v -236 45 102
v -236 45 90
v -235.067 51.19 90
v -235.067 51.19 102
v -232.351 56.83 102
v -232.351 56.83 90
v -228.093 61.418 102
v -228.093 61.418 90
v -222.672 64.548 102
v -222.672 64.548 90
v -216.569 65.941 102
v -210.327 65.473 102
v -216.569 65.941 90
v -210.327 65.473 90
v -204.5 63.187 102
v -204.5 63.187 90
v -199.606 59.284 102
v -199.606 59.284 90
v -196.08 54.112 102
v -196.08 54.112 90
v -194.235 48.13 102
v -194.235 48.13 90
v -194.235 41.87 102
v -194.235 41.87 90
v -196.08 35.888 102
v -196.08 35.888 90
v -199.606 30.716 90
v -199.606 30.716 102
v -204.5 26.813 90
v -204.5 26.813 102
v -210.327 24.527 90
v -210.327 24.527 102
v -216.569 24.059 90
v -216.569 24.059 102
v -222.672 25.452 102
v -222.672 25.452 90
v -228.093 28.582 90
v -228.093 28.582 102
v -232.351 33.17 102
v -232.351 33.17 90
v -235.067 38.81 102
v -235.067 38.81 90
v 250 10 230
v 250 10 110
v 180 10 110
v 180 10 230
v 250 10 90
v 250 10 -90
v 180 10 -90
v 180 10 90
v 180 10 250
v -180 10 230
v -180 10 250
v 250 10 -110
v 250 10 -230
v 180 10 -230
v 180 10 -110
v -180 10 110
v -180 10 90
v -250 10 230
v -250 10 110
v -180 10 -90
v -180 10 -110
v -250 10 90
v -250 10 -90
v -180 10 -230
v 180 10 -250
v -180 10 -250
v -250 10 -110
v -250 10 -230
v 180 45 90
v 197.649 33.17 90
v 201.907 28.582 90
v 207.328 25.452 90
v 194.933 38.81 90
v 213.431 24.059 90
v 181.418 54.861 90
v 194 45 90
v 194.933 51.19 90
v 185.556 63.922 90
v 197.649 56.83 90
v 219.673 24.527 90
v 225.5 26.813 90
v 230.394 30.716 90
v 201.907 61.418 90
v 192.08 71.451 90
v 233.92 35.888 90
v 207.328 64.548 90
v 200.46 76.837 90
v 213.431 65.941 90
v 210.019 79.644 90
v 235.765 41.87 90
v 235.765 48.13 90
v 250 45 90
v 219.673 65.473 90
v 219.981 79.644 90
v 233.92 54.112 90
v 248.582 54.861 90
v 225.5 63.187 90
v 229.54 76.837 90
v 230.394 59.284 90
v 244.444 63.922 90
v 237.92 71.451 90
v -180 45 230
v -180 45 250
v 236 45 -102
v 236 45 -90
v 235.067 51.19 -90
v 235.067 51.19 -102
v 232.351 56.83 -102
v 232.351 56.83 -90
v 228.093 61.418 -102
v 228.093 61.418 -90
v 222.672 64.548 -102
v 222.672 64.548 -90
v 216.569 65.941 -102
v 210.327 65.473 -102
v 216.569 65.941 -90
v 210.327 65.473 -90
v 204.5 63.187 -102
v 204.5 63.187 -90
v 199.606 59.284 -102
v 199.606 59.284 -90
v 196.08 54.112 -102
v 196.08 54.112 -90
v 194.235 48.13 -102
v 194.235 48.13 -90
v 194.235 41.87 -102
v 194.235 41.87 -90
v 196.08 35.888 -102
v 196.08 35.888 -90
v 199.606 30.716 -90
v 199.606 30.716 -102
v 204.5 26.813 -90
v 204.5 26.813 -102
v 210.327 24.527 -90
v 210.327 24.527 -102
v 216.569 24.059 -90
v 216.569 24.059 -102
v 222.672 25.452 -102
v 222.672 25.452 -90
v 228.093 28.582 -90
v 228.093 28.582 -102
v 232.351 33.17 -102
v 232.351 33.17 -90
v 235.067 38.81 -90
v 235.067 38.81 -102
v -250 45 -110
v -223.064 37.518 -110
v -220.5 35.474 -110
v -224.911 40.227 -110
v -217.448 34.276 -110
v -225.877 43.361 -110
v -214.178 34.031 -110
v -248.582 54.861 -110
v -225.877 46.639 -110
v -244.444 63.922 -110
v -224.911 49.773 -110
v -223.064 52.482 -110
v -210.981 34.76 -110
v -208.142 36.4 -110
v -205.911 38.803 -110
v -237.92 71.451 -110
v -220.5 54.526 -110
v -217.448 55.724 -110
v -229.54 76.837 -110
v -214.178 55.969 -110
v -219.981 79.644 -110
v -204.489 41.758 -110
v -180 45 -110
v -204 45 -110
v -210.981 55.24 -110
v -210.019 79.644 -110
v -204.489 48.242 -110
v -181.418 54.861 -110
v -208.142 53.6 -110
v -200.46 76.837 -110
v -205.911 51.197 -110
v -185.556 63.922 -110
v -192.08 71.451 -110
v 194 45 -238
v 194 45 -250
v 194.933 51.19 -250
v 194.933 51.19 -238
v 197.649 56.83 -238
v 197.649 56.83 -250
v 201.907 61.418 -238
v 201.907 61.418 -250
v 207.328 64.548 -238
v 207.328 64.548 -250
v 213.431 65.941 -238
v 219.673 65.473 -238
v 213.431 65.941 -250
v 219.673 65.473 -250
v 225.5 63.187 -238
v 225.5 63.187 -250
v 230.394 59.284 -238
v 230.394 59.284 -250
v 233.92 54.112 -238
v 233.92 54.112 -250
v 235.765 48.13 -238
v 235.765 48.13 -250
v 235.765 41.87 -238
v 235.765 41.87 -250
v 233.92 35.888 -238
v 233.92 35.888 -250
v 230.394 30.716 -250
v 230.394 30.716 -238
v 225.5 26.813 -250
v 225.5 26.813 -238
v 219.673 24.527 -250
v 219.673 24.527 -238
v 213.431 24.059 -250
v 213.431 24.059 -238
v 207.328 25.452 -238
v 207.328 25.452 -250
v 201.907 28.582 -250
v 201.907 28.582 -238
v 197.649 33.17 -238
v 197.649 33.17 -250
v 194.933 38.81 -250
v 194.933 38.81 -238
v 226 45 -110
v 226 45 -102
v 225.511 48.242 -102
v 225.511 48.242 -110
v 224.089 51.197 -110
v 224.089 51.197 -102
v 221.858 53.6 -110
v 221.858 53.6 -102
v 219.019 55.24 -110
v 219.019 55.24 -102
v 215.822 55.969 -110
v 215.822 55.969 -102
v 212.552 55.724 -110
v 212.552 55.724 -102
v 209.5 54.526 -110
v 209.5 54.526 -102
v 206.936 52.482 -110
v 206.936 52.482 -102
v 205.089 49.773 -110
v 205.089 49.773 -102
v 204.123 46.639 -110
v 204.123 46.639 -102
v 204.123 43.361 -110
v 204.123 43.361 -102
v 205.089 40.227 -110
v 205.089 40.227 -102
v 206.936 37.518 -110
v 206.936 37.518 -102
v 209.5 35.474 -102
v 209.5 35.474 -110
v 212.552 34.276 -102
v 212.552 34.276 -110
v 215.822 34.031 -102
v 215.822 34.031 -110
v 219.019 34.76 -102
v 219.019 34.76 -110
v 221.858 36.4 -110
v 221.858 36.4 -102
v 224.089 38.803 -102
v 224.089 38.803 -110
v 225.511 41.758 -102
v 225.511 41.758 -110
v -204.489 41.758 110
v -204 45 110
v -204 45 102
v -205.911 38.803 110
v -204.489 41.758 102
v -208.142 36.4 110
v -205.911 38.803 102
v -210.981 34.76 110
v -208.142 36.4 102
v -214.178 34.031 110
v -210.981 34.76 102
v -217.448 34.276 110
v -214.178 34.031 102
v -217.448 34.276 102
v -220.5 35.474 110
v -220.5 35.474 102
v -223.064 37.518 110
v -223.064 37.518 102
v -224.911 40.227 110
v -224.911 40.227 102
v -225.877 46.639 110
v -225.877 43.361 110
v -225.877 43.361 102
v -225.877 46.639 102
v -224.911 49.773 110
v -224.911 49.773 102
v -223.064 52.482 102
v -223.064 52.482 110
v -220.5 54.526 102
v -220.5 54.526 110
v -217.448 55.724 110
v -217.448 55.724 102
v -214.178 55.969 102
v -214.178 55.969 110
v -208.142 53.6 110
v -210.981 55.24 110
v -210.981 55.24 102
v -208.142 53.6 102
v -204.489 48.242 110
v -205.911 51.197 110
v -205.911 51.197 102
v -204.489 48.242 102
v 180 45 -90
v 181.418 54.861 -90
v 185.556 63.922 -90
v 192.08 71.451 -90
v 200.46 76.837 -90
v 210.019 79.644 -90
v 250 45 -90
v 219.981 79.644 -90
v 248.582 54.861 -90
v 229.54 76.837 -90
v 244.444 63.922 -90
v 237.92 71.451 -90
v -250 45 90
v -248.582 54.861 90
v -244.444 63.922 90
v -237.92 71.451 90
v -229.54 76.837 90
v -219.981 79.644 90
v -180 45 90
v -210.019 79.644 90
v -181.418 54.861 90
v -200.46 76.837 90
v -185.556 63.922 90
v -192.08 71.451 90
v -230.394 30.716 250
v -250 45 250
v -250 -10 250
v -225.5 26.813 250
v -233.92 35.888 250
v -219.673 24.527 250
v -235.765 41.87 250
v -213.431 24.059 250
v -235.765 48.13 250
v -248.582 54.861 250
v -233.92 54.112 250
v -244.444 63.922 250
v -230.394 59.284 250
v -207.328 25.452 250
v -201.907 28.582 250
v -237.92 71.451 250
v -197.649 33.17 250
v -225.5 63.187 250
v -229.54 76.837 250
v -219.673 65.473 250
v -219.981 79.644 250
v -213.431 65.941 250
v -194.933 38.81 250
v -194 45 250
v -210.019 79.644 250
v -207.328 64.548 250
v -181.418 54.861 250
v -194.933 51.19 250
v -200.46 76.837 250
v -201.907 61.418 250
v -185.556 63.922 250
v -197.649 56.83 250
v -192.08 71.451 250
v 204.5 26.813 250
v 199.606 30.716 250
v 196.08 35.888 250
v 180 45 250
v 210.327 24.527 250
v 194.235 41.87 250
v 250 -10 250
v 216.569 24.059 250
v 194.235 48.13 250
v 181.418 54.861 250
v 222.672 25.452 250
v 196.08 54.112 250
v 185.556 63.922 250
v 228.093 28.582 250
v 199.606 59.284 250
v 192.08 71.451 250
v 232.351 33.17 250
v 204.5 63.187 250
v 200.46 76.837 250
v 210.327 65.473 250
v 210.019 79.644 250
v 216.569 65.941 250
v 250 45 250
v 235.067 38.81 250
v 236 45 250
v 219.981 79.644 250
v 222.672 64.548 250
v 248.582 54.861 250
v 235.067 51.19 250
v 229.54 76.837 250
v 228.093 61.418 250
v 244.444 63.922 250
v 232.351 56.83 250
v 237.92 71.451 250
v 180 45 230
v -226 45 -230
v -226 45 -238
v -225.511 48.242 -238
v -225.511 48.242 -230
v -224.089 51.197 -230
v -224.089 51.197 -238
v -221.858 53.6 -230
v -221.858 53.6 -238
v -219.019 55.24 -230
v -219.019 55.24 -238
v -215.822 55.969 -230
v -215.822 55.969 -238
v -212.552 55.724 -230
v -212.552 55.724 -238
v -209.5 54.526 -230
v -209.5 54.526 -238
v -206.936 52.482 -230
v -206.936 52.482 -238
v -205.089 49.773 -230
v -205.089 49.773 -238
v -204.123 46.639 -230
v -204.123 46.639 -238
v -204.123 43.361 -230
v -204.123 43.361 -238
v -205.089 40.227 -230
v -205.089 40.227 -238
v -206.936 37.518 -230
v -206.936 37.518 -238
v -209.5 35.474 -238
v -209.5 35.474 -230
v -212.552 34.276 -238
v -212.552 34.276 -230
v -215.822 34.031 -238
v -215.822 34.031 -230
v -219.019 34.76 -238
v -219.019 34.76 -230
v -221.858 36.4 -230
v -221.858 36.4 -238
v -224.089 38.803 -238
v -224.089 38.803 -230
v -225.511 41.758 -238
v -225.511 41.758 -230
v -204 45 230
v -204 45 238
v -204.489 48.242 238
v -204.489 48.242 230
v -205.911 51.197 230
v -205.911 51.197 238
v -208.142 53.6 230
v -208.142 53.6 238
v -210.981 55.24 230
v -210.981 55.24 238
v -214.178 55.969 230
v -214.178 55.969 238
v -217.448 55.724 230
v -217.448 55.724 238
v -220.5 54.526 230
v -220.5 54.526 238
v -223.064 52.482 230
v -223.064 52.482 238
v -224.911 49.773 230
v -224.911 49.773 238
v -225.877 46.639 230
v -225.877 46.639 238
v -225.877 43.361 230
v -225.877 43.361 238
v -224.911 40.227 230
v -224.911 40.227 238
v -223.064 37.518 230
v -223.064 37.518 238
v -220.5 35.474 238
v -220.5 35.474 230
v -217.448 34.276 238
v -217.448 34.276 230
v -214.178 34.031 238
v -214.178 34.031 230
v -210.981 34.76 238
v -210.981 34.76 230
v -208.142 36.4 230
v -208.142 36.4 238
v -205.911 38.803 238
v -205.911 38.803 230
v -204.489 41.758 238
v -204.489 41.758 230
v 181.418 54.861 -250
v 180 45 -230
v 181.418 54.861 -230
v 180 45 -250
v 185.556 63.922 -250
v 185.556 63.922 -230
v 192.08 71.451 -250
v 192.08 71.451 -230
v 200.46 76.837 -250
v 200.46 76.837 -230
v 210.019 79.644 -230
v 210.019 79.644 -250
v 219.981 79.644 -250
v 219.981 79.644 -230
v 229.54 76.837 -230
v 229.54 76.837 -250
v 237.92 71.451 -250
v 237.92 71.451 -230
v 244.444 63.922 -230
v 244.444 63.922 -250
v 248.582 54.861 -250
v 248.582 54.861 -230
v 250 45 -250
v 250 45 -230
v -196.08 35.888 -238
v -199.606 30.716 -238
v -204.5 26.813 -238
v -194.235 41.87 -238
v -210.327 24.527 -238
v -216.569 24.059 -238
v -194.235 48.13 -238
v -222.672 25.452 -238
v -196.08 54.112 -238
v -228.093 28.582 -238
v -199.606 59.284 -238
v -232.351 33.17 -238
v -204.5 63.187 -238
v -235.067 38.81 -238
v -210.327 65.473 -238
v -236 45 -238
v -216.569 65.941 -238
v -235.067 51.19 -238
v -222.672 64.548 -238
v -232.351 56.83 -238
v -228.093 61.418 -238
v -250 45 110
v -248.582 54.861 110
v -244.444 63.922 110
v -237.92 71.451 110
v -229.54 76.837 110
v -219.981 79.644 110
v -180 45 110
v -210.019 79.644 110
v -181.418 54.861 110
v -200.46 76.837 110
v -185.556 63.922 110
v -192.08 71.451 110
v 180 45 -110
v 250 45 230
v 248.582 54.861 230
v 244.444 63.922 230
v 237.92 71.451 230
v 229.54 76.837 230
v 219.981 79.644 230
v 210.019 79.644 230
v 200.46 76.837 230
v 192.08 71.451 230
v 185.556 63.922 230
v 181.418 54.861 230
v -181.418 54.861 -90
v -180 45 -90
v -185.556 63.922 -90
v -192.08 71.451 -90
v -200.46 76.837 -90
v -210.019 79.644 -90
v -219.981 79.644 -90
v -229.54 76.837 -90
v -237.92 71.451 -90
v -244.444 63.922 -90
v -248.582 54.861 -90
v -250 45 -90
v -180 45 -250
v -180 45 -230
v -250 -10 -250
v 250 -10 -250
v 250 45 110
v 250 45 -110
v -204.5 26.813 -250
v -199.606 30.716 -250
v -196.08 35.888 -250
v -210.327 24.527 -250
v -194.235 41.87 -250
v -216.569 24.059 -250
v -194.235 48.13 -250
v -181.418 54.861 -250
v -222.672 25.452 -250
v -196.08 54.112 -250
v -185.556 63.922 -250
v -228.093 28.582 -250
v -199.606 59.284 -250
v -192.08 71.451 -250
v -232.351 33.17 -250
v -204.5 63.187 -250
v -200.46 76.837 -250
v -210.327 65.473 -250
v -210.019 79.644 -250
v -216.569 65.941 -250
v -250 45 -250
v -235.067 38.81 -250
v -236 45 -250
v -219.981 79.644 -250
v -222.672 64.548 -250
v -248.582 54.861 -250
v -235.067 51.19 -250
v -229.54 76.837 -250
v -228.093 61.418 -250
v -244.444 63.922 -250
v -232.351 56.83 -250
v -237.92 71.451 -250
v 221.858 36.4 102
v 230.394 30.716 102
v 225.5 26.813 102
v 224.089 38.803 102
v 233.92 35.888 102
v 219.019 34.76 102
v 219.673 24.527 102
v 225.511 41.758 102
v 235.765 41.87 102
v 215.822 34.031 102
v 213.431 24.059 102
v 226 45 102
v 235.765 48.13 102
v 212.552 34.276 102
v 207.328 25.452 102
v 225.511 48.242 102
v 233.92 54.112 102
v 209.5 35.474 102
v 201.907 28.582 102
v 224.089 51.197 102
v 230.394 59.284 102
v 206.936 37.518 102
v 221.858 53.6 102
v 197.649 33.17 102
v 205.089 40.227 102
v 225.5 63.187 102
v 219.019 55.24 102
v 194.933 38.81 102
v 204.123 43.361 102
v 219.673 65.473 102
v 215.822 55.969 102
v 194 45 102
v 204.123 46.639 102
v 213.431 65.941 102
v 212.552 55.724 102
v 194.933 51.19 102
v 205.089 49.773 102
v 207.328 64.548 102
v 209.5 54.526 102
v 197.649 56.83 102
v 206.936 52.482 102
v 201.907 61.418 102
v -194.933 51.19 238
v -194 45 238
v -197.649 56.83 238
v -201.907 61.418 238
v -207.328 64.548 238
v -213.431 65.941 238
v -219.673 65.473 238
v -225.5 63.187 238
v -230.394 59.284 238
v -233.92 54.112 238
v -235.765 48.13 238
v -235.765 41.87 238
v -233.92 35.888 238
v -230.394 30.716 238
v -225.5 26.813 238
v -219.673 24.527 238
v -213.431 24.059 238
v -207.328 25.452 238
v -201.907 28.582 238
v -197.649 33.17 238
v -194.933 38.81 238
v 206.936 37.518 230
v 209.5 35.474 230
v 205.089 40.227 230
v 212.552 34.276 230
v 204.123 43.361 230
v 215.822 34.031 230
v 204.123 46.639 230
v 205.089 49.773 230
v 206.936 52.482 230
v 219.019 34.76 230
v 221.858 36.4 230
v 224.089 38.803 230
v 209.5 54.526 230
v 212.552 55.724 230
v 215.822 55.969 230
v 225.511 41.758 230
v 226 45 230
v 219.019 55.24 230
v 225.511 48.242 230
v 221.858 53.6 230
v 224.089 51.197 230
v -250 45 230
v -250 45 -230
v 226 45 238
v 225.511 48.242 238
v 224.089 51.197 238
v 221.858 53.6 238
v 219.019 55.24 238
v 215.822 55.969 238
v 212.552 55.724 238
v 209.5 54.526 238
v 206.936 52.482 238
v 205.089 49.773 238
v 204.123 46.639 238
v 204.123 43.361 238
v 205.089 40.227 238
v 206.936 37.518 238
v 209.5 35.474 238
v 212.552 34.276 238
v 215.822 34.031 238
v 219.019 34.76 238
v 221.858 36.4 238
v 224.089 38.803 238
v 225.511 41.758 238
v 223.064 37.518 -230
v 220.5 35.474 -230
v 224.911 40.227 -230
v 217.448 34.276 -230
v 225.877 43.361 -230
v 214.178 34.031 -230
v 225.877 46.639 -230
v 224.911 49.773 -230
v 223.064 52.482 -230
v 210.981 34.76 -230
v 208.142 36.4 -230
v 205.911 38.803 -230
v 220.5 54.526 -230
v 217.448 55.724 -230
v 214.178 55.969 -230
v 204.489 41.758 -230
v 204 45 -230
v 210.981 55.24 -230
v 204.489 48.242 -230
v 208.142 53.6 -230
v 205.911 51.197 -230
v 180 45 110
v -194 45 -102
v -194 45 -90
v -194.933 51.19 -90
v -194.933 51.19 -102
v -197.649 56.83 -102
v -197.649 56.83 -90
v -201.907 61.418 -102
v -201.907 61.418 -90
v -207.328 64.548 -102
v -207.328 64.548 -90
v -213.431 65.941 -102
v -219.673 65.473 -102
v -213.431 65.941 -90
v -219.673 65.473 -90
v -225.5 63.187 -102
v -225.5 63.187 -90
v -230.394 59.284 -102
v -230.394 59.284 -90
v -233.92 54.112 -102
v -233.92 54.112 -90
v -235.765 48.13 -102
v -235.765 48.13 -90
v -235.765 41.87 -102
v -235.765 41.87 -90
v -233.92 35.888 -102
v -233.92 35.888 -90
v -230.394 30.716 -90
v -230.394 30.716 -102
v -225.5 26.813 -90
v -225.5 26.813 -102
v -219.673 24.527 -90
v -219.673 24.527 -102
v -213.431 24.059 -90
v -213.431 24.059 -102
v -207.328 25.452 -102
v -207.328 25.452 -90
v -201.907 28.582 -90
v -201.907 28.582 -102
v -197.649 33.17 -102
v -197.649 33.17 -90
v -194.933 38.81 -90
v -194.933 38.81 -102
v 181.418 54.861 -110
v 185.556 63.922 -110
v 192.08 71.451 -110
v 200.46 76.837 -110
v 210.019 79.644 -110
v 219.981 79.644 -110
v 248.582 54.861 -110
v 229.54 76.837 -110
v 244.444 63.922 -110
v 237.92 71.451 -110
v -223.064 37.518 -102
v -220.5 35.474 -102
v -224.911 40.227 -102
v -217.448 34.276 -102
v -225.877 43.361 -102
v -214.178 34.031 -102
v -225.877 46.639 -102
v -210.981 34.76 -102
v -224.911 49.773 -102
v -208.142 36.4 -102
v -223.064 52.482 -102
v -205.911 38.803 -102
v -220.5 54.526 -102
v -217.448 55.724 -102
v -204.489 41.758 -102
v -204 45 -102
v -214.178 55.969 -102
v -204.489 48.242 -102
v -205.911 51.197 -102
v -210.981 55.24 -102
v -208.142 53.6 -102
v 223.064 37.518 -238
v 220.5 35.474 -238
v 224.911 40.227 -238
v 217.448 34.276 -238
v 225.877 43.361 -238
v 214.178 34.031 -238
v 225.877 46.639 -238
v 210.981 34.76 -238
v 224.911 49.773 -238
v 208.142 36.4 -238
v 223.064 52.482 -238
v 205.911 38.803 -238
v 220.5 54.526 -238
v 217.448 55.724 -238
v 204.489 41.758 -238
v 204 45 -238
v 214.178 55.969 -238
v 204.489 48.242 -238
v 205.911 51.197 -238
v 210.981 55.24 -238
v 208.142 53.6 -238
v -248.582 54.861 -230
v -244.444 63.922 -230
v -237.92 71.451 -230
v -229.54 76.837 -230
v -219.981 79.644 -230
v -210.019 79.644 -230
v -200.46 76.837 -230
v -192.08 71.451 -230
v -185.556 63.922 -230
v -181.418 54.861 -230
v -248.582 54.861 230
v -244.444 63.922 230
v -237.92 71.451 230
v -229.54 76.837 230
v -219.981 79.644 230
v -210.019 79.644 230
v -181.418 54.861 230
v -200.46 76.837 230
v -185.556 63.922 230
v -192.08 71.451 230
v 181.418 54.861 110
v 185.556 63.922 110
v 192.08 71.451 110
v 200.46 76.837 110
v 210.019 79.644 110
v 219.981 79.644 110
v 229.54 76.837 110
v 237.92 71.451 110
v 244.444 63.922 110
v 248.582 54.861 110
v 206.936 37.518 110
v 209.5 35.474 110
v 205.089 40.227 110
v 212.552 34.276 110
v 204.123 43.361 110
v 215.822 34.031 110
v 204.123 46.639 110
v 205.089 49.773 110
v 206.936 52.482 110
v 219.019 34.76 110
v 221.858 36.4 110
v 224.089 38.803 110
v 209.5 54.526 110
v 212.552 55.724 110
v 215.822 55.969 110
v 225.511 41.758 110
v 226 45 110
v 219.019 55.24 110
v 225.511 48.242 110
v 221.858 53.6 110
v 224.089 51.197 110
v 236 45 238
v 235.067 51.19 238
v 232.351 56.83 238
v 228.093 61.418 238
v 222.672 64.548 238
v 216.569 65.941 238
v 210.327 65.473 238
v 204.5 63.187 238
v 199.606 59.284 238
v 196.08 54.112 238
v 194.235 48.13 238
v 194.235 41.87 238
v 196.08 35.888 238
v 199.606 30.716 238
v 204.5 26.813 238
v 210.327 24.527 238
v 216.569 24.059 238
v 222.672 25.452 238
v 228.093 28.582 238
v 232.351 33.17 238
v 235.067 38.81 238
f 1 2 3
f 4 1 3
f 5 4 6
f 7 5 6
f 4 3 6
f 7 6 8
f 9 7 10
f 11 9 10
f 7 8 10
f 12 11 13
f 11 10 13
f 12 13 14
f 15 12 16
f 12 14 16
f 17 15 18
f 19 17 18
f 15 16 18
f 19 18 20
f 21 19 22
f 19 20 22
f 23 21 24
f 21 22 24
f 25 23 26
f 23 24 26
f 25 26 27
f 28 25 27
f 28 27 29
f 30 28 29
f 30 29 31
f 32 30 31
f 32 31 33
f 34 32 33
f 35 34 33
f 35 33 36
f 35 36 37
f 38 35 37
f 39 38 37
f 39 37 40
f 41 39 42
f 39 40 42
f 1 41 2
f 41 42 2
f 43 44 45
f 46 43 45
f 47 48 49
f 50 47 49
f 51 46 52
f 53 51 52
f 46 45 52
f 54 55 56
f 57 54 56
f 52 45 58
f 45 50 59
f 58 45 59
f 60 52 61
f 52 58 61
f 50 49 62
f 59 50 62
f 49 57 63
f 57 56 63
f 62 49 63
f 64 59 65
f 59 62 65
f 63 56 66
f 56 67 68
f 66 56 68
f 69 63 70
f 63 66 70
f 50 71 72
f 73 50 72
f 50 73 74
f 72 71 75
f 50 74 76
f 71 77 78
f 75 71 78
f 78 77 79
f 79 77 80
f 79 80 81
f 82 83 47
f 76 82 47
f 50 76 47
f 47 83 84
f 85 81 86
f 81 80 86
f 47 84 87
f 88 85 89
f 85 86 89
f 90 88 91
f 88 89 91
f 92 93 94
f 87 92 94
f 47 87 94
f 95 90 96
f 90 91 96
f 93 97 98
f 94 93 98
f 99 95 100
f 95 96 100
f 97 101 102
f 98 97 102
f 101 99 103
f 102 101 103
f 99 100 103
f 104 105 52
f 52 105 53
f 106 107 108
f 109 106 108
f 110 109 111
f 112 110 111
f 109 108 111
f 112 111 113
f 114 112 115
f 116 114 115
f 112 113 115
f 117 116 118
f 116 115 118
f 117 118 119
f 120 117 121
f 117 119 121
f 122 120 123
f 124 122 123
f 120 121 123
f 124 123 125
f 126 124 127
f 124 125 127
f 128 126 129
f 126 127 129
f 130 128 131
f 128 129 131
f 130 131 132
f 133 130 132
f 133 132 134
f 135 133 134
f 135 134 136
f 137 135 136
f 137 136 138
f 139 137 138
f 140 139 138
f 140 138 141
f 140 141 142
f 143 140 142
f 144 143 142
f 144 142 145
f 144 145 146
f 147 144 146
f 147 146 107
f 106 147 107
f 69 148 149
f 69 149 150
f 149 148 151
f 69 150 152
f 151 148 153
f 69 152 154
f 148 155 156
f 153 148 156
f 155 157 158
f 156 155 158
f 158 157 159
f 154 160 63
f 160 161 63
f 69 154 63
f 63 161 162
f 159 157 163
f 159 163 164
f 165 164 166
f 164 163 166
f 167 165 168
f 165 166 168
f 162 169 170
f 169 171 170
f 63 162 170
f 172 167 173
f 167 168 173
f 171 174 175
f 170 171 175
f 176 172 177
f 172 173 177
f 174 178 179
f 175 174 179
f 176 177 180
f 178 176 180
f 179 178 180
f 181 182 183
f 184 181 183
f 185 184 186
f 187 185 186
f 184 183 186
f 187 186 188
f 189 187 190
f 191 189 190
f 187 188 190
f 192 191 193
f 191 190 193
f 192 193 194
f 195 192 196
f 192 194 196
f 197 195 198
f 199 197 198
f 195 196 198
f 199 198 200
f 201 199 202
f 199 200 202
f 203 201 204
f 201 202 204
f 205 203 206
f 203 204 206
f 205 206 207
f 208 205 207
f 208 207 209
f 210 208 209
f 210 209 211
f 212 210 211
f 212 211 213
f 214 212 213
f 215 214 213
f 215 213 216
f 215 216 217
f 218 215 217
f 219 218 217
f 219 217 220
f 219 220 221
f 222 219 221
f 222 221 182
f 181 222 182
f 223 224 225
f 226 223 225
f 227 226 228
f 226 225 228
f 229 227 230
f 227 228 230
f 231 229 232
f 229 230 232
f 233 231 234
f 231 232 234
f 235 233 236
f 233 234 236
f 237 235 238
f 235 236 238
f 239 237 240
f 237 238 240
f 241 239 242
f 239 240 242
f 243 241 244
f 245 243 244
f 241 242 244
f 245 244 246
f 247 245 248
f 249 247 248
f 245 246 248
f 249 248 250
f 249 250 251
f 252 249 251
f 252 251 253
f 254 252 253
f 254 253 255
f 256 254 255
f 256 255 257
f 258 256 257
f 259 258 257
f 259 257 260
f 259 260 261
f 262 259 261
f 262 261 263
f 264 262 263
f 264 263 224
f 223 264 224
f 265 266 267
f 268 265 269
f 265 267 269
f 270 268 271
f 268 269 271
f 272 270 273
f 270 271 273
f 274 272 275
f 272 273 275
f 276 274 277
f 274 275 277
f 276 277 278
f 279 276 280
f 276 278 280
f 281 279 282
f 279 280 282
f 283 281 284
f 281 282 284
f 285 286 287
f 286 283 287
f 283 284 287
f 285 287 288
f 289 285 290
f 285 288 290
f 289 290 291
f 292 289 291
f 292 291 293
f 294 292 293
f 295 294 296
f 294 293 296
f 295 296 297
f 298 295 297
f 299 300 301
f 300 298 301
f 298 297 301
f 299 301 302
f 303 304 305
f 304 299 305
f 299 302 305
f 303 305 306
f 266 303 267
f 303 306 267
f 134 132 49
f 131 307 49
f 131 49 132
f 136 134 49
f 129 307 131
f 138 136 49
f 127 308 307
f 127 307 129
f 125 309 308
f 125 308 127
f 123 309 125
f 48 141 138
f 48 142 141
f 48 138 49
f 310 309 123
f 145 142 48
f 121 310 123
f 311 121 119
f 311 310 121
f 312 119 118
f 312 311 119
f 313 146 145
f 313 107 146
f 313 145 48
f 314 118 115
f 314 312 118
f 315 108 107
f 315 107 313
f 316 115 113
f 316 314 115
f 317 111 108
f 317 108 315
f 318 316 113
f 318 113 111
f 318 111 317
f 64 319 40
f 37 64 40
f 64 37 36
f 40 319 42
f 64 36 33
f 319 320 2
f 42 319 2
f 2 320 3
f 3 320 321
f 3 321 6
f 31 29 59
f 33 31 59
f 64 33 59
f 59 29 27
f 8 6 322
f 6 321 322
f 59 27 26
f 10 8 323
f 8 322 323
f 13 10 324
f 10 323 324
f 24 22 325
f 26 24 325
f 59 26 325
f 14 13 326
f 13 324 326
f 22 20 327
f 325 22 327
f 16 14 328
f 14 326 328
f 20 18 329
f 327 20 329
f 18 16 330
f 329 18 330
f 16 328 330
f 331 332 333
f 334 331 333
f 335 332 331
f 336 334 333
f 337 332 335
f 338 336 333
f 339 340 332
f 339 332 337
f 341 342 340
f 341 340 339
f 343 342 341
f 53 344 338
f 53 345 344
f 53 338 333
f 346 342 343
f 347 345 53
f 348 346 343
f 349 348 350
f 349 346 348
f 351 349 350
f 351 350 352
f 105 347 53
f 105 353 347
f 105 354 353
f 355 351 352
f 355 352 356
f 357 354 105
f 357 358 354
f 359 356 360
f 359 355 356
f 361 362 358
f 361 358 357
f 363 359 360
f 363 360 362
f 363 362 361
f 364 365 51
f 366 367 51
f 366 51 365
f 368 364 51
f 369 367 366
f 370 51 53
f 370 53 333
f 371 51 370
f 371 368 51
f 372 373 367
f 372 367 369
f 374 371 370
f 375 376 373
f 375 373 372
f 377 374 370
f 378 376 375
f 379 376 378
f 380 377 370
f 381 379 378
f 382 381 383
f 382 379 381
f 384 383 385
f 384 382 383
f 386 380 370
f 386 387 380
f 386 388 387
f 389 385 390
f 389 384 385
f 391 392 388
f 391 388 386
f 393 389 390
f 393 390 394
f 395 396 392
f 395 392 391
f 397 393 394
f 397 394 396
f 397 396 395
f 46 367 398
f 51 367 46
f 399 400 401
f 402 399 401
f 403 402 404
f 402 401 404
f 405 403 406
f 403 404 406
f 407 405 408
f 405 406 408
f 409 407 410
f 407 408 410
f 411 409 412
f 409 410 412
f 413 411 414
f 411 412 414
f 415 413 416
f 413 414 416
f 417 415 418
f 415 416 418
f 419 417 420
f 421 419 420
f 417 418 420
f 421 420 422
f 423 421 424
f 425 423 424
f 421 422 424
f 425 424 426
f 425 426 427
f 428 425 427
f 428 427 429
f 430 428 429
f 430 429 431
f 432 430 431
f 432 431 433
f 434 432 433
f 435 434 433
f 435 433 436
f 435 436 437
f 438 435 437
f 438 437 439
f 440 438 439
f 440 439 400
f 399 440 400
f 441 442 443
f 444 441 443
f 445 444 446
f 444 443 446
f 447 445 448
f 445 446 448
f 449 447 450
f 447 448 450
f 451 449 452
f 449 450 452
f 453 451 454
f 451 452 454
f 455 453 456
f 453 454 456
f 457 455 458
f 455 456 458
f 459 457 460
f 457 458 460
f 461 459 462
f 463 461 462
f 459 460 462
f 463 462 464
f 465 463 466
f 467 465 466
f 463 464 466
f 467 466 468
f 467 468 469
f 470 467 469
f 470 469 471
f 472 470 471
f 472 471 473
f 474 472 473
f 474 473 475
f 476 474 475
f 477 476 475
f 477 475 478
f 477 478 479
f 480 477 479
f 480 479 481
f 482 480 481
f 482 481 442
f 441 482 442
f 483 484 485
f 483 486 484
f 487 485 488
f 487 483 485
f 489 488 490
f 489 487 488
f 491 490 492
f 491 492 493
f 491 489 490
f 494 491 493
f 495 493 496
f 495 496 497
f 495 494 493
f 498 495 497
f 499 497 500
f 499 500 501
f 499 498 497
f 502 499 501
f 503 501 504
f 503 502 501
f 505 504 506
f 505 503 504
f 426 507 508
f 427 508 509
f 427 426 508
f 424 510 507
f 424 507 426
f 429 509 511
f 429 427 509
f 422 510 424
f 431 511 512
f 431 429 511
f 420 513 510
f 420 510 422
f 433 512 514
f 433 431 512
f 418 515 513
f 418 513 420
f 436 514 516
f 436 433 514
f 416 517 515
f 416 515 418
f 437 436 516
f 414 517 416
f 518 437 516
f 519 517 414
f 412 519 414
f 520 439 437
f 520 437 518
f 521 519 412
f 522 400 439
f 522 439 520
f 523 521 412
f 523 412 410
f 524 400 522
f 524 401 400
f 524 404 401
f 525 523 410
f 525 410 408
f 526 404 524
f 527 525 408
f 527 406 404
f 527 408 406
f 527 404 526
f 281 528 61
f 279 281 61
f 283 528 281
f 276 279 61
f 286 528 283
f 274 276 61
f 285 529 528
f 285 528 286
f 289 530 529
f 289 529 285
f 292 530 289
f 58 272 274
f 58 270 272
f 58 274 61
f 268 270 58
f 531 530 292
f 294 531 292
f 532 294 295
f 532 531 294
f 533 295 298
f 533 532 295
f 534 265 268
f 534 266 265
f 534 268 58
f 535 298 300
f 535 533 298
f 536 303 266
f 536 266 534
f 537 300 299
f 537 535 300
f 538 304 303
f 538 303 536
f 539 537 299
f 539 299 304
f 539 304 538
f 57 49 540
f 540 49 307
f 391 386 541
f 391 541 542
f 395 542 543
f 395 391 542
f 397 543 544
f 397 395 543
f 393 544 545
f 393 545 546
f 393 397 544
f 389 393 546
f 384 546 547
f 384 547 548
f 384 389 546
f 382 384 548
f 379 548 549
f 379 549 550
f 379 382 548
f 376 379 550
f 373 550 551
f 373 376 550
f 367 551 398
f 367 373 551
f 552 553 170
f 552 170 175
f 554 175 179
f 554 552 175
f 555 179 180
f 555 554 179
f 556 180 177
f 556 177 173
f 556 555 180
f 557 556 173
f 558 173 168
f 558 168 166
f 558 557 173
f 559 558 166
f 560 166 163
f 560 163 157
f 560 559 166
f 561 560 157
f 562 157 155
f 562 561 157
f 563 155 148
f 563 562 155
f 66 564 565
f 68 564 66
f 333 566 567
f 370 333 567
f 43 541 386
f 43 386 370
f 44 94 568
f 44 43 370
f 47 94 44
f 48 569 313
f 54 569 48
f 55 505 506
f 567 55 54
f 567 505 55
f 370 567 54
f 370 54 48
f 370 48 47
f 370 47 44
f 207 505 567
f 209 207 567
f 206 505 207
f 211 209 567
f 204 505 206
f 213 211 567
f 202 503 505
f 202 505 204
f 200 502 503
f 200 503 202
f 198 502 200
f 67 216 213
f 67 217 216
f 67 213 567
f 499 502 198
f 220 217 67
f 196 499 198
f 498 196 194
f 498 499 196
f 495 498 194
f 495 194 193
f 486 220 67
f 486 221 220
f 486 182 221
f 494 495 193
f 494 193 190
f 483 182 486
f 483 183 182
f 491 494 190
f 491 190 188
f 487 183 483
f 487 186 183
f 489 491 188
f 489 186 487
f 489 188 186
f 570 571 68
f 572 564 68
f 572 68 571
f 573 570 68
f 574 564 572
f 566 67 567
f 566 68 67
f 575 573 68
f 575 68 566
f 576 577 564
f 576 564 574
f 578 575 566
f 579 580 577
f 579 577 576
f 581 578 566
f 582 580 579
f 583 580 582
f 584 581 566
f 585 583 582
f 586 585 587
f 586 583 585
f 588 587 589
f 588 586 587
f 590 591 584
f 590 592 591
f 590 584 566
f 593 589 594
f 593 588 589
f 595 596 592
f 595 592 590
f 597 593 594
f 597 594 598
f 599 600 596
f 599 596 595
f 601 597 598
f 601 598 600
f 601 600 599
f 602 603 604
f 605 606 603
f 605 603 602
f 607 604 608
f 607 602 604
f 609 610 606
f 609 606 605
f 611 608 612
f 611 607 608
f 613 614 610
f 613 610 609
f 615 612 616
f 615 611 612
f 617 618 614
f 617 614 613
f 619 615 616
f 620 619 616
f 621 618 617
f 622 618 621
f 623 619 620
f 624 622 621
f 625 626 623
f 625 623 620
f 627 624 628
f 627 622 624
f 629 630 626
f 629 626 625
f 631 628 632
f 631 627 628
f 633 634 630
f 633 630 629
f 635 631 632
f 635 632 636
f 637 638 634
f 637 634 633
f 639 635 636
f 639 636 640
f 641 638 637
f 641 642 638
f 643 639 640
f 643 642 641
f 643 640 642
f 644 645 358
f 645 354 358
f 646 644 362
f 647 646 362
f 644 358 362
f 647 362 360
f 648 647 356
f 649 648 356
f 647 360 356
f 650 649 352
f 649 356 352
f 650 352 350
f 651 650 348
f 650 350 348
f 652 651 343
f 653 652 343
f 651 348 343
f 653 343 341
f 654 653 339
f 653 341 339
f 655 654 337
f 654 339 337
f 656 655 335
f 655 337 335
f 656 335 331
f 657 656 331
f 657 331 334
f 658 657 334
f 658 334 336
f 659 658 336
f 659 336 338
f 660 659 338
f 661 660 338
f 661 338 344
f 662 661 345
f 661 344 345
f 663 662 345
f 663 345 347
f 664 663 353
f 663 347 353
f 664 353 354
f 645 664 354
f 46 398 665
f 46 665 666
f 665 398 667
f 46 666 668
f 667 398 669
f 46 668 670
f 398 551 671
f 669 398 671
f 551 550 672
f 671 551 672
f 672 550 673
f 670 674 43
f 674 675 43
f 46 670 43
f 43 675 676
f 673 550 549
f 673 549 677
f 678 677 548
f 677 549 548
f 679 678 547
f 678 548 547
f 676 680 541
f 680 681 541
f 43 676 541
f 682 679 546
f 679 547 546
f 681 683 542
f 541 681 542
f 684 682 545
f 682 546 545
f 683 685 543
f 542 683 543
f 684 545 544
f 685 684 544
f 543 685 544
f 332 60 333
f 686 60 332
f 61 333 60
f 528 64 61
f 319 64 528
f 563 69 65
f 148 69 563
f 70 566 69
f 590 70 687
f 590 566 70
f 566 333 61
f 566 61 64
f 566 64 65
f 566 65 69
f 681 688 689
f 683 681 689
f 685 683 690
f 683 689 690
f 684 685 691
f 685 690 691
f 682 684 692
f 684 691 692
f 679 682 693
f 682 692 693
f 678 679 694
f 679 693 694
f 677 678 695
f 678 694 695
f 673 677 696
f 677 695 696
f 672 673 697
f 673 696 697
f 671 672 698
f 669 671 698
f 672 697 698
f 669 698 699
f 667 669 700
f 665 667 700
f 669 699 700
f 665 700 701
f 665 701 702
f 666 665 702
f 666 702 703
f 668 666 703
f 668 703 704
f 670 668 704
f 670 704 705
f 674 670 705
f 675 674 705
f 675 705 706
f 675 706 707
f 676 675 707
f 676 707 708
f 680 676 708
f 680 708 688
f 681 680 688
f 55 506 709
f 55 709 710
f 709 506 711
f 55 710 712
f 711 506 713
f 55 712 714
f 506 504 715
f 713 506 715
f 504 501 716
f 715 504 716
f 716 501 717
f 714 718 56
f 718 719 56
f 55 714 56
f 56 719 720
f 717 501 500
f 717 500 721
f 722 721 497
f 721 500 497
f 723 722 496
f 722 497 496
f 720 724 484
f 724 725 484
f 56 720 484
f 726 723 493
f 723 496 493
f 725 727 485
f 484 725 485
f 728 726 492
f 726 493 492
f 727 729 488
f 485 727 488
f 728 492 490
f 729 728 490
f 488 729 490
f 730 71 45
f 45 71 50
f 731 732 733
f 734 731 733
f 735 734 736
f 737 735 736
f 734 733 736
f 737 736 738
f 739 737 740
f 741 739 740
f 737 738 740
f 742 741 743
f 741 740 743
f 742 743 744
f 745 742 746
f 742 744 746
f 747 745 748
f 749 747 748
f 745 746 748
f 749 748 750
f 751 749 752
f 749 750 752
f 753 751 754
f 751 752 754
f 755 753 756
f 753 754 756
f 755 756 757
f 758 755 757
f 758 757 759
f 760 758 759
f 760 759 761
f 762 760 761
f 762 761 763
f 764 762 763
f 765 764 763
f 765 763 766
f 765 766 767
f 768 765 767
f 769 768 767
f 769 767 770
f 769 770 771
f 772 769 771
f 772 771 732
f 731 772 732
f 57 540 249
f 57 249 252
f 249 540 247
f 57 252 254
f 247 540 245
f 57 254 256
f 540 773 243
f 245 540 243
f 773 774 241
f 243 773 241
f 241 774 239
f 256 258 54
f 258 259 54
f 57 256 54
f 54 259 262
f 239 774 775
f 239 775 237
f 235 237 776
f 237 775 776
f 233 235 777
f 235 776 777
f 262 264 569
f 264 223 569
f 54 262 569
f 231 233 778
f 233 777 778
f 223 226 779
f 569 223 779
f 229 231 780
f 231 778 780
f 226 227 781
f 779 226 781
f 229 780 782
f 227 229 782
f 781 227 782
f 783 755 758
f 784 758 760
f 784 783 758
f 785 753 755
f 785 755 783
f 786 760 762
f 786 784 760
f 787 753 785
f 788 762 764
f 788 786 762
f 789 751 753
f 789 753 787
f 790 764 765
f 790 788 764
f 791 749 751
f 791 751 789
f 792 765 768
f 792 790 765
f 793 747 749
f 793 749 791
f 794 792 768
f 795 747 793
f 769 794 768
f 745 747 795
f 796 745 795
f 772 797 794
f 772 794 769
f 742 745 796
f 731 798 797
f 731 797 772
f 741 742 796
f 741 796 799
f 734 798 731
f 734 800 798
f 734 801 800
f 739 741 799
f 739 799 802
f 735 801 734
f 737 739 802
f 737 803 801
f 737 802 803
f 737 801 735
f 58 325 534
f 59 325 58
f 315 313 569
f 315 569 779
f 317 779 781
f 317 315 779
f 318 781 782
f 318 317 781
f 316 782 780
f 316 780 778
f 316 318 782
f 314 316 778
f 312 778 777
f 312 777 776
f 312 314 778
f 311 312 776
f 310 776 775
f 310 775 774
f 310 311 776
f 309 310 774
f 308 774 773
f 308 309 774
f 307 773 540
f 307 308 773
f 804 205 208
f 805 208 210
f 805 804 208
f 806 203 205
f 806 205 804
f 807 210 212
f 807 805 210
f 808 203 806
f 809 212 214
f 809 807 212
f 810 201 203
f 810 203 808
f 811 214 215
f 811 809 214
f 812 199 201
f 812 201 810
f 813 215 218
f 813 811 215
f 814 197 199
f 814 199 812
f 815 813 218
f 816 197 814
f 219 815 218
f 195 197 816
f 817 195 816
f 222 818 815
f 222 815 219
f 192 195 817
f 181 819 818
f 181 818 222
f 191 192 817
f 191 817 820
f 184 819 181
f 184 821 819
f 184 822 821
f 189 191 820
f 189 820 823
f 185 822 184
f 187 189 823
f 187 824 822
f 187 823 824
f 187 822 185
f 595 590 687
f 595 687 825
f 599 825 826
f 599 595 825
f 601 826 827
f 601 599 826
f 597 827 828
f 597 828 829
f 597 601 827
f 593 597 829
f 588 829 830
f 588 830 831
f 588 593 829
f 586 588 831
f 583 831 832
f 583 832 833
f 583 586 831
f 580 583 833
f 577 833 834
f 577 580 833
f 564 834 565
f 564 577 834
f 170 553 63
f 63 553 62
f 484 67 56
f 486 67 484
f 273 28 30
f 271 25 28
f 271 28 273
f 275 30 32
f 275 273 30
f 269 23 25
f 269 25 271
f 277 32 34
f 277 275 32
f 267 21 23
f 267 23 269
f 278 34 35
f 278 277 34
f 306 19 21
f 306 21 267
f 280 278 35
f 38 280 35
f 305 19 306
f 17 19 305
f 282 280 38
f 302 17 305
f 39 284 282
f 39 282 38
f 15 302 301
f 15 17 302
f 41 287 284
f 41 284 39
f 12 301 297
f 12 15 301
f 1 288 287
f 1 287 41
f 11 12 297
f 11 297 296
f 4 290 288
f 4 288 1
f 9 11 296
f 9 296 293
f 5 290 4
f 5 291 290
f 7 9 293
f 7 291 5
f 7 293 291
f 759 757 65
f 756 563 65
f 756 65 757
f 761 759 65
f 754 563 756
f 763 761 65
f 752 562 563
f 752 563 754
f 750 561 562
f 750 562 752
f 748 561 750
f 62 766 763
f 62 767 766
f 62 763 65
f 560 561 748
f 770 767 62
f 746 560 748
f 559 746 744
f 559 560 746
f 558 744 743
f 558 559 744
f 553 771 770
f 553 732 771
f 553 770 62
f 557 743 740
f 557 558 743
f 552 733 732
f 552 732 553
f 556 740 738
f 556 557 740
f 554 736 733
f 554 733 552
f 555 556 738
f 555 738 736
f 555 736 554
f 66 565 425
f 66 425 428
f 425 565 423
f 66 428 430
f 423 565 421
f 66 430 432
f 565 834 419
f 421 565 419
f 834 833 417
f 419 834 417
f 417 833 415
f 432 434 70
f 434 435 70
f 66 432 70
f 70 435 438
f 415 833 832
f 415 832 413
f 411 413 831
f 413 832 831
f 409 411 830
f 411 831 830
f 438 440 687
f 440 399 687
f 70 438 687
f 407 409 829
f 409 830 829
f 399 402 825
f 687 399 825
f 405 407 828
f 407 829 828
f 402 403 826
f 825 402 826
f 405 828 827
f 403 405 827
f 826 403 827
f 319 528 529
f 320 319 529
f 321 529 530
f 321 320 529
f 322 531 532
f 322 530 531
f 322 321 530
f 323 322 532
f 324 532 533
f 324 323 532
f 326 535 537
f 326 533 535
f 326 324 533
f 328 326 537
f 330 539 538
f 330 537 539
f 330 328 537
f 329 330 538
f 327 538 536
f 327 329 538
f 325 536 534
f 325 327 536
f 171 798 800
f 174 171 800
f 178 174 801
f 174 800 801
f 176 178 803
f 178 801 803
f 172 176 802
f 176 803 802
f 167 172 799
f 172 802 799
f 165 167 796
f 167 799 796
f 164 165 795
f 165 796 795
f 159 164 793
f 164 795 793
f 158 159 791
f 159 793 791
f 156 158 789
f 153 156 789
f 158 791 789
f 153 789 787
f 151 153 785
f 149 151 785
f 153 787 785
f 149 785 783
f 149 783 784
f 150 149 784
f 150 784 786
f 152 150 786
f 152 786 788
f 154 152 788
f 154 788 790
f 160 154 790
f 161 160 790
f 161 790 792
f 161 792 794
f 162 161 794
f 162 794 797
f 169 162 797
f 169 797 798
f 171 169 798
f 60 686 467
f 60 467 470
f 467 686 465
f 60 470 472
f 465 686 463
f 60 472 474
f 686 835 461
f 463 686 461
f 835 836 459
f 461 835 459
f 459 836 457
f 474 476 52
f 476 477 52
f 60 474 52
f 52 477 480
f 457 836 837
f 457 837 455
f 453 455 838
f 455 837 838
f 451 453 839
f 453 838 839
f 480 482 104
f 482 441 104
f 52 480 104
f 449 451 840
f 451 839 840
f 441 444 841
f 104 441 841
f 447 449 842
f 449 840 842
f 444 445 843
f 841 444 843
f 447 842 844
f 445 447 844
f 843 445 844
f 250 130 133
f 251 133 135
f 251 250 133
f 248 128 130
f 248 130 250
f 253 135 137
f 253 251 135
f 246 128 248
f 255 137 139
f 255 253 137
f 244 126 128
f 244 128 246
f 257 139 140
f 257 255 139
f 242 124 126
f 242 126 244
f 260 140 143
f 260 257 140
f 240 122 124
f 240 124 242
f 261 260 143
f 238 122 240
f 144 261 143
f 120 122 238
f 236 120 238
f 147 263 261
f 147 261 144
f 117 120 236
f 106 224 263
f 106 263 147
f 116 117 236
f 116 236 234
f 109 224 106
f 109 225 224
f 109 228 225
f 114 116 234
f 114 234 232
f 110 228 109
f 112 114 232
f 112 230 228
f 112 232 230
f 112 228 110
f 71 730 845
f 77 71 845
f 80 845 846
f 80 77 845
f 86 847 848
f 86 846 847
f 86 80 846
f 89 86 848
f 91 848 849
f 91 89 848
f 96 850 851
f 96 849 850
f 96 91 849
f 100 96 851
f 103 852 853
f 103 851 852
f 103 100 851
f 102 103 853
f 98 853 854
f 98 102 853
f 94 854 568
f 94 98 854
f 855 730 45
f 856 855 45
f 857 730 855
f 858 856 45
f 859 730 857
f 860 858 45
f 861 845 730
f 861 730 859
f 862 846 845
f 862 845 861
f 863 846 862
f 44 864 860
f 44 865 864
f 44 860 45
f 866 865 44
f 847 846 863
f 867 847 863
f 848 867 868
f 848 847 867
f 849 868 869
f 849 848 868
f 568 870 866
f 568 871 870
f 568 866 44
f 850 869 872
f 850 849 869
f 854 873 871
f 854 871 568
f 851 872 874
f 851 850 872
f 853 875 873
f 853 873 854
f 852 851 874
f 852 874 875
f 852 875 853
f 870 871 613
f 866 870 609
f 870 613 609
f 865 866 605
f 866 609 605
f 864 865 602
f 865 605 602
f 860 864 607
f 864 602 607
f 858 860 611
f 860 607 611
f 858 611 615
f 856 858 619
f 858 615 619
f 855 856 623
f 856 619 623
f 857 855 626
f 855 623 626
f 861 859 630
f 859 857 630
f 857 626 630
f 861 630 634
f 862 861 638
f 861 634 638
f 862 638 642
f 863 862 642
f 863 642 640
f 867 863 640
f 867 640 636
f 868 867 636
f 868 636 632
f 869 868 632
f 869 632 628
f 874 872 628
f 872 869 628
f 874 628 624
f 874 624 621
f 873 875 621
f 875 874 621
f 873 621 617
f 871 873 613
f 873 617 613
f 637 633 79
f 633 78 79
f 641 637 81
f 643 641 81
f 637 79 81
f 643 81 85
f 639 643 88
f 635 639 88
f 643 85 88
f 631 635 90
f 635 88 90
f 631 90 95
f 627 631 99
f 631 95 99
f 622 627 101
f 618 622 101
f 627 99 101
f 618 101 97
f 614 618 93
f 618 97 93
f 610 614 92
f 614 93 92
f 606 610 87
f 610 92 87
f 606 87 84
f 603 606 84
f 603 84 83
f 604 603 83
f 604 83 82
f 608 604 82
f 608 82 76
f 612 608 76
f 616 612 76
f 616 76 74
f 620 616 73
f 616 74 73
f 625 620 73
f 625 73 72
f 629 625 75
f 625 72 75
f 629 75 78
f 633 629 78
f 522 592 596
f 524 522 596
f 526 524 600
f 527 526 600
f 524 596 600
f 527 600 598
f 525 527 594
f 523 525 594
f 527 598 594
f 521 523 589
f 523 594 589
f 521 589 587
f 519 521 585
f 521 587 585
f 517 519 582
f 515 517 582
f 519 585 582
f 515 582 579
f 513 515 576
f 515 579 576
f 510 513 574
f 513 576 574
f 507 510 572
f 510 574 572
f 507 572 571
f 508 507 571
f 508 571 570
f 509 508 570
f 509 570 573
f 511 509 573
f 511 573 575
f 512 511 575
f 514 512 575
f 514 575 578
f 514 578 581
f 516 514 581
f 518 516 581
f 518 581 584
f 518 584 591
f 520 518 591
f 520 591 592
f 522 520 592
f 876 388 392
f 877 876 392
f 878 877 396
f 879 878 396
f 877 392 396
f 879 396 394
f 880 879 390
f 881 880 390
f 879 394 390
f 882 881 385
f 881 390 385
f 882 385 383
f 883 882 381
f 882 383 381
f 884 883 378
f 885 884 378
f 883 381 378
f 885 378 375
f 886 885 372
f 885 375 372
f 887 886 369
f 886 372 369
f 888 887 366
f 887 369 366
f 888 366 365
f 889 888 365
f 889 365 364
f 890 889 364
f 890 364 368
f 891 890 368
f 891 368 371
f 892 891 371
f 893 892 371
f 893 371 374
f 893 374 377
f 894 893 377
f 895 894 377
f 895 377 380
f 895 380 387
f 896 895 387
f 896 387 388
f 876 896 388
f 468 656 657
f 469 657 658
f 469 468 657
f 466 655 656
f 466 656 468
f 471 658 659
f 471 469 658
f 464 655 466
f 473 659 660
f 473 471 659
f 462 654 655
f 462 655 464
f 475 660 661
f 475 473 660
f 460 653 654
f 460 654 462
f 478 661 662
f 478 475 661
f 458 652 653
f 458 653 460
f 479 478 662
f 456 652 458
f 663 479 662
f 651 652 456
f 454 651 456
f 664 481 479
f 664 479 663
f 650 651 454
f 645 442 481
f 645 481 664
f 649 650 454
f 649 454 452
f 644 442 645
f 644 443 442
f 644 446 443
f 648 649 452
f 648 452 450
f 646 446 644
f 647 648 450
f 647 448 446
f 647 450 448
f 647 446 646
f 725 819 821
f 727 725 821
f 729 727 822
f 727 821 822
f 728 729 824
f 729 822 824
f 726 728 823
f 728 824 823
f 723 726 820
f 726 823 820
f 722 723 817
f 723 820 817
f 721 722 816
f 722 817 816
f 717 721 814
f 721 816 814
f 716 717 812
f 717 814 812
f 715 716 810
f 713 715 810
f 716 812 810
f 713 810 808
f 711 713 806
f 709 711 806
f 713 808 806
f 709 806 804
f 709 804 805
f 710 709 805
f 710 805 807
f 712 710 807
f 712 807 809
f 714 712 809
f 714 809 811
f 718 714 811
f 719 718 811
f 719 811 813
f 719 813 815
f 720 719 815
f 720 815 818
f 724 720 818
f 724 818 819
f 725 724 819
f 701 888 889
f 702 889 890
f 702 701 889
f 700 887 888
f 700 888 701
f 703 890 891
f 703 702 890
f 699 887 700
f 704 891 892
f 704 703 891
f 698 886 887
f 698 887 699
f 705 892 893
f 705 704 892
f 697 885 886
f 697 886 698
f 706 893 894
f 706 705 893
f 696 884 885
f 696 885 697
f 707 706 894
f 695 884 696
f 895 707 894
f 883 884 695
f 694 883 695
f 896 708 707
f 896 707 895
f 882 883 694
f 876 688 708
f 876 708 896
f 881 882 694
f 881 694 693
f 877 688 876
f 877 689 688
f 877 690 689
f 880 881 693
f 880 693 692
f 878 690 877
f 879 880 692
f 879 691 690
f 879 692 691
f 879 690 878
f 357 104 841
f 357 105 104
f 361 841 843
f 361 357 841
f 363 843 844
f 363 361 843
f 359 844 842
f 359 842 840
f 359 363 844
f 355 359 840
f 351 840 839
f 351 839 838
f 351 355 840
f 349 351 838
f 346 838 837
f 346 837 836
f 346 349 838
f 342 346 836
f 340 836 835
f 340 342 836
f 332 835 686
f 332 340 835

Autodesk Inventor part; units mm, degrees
ref_plane "YZ Plane" through (0, 0, 0) normal (1, 0, 0) x (0, 1, 0)
sketch "Sketch1" plane through (0, 0, 0) normal (0, 0, 1) x (1, 0, 0)
  line L0 (-250, -10) -> (250, -10)
  line L1 (250, -10) -> (250, 10)
  line L2 (250, 10) -> (-250, 10)
  line L3 (-250, 10) -> (-250, -10)
  line L4 (-250, -10) -> (250, 10) construction
  line L5 (250, -10) -> (-250, 10) construction
  point P0 (0, 0)
  dimension "d0" = 500
  dimension "d1" = 20
extrude "Extrusion1" add sketch "Sketch1" along normal mid plane 500
sketch "Sketch2" plane through (0, 0, 250) normal (0, 0, 1) x (1, 0, 0)
  arc A0 (-180, 45) -> (-250, 45) centre (-215, 45) ccw
  line L0 (250, 10) -> (-250, 10) construction
  circle A1 centre (-215, 45) radius 11
  line L1 (-250, 45) -> (-250, 0)
  line L2 (-180, 45) -> (-180, 0)
  line L3 (-180, 0) -> (-250, 0)
  point P0 (0, 0)
  dimension "d4" = 70
  dimension "d5" = 215
  dimension "d6" = 45
  dimension "d7" = 22
  dimension "d9" = 10
extrude "Extrusion2" add sketch "Sketch2" against normal blind 20
ref_plane "Work Plane1" through (0, 0, 90) normal (0, 0, 1) x (1, 0, 0)
sketch "Sketch3" plane through (0, 0, 90) normal (0, 0, 1) x (1, 0, 0)
  arc A0 (-180, 45) -> (-250, 45) centre (-215, 45) ccw construction
  circle A1 centre (-215, 45) radius 11 construction
  line L0 (-180, 45) -> (-180, 10) construction
  line L1 (-250, 45) -> (-250, -10) construction
  circle A2 centre (-215, 45) radius 11
  arc A3 (-180, 45) -> (-250, 45) centre (-215, 45) ccw
  line L2 (-250, 45) -> (-250, 0)
  line L3 (-180, 45) -> (-180, 0)
  line L4 (-180, 0) -> (-250, 0)
  point P0 (0, 0)
extrude "Extrusion3" add sketch "Sketch3" along normal blind 20
sketch "Sketch4" plane through (0, 0, 250) normal (0, 0, 1) x (1, 0, 0)
  circle A0 centre (-215, 45) radius 11 construction
  circle A1 centre (-215, 45) radius 21
  point P0 (0, 0)
  dimension "d15" = 42
extrude "Extrusion4" cut sketch "Sketch4" against normal blind 12
sketch "Sketch5" plane through (0, 0, 90) normal (0, 0, -1) x (-1, 0, 0)
  circle A0 centre (215, 45) radius 11 construction
  circle A1 centre (215, 45) radius 21
  point P0 (0, 0)
  dimension "d18" = 42
extrude "Extrusion5" cut sketch "Sketch5" against normal blind 12
sketch "Sketch6" plane through (0, 0, 250) normal (0, 0, 1) x (1, 0, 0)
  arc A0 (250, 45) -> (180, 45) centre (215, 45) ccw
  circle A1 centre (215, 45) radius 11
  line L0 (180, 45) -> (180, 0)
  line L1 (180, 0) -> (250, 0)
  line L2 (250, 0) -> (250, 45)
  point P0 (0, 0)
  dimension "d21" = 70
  dimension "d22" = 215
  dimension "d23" = 45
  dimension "d24" = 22
  dimension "d25" = 0
extrude "Extrusion6" add sketch "Sketch6" against normal blind 20
sketch "Sketch7" plane through (0, 0, 90) normal (0, 0, 1) x (1, 0, 0)
  arc A0 (250, 45) -> (180, 45) centre (215, 45) ccw construction
  circle A1 centre (215, 45) radius 11 construction
  arc A2 (250, 45) -> (180, 45) centre (215, 45) ccw
  circle A3 centre (215, 45) radius 11 projected
  circle A4 centre (215, 45) radius 11
  line L0 (250, 45) -> (250, 10) projected
  line L1 (250, 45) -> (250, 0)
  line L2 (250, 0) -> (250, 0)
  arc A5 (250, 45) -> (180, 45) centre (215, 45) ccw projected
  line L3 (250, 0) -> (250, 45)
  line L4 (180, 45) -> (180, 0)
  line L5 (180, 0) -> (250, 0)
  point P0 (0, 0)
  dimension "d28" = 22
  dimension "d29" = 45
extrude "Extrusion7" add sketch "Sketch7" along normal blind 20
sketch "Sketch8" plane through (0, 0, 250) normal (0, 0, 1) x (1, 0, 0)
  circle A0 centre (215, 45) radius 11 construction
  circle A1 centre (215, 45) radius 21
  point P0 (0, 0)
  dimension "d32" = 42
extrude "Extrusion8" cut sketch "Sketch8" against normal blind 12
sketch "Sketch9" plane through (0, 0, 90) normal (0, 0, -1) x (-1, 0, 0)
  circle A0 centre (-215, 45) radius 11 construction
  circle A1 centre (-215, 45) radius 21
  point P0 (0, 0)
  dimension "d35" = 42
extrude "Extrusion9" cut sketch "Sketch9" against normal blind 12
sketch "Sketch10" plane through (0, 0, -250) normal (0, 0, -1) x (-1, 0, 0)
  arc A0 (-180, 45) -> (-250, 45) centre (-215, 45) ccw construction
  line L0 (-180, 45) -> (-180, 10) construction
  line L1 (-250, 10) -> (-250, 45) construction
  line L2 (250, 10) -> (-250, 10) construction
  circle A1 centre (-215, 45) radius 11 construction
  arc A2 (-180, 45) -> (-250, 45) centre (-215, 45) ccw
  arc A3 (-180, 45) -> (-250, 45) centre (-215, 45) ccw projected
  circle A4 centre (-215, 45) radius 11
  line L3 (-250, 45) -> (-250, 10)
  line L4 (-250, -10) -> (-250, 45) construction
  line L5 (-180, 10) -> (-180, 45)
  line L6 (-250, 10) -> (-180, 10)
  point P0 (0, 0)
  dimension "d38" = 22
extrude "Extrusion10" add sketch "Sketch10" against normal blind 20
sketch "Sketch11" plane through (0, 0, -250) normal (0, 0, -1) x (-1, 0, 0)
  arc A0 (250, 45) -> (180, 45) centre (215, 45) ccw construction
  circle A1 centre (215, 45) radius 11 construction
  arc A2 (250, 45) -> (180, 45) centre (215, 45) ccw
  arc A3 (250, 45) -> (180, 45) centre (215, 45) ccw projected
  circle A4 centre (215, 45) radius 11
  line L0 (180, 45) -> (180, 10) projected
  line L1 (180, 10) -> (250, 10) projected
  line L2 (180, 45) -> (180, 10)
  line L3 (180, 10) -> (250, 10)
  line L4 (250, 10) -> (250, 45)
  point P0 (0, 0)
  dimension "d41" = 22
extrude "Extrusion11" add sketch "Sketch11" against normal blind 20
ref_plane "Work Plane2" through (0, 0, -90) normal (0, 0, 1) x (1, 0, 0)
sketch "Sketch12" plane through (0, 0, -90) normal (0, 0, 1) x (1, 0, 0)
  arc A0 (250, 45) -> (180, 45) centre (215, 45) ccw construction
  circle A1 centre (215, 45) radius 11 construction
  arc A2 (250, 45) -> (180, 45) centre (215, 45) ccw
  arc A3 (250, 45) -> (180, 45) centre (215, 45) ccw projected
  circle A4 centre (215, 45) radius 11
  line L0 (250, 10) -> (180, 10) projected
  line L1 (250, 45) -> (250, 10)
  line L2 (250, 10) -> (180, 10)
  line L3 (180, 10) -> (180, 45)
  point P0 (0, 0)
extrude "Extrusion12" add sketch "Sketch12" against normal blind 20
sketch "Sketch13" plane through (0, 0, -250) normal (0, 0, -1) x (-1, 0, 0)
  circle A0 centre (-215, 45) radius 11 construction
  circle A1 centre (-215, 45) radius 21
  point P0 (0, 0)
  dimension "d47" = 42
extrude "Extrusion13" cut sketch "Sketch13" against normal blind 12
sketch "Sketch14" plane through (0, 0, -90) normal (0, 0, 1) x (1, 0, 0)
  circle A0 centre (215, 45) radius 11 construction
  circle A1 centre (215, 45) radius 21
  point P0 (0, 0)
  dimension "d50" = 42
extrude "Extrusion14" cut sketch "Sketch14" against normal blind 12
sketch "Sketch15" plane through (0, 0, -90) normal (0, 0, 1) x (1, 0, 0)
  arc A0 (-180, 45) -> (-250, 45) centre (-215, 45) ccw projected
  arc A1 (-180, 45) -> (-250, 45) centre (-215, 45) ccw
  arc A2 (-180, 45) -> (-250, 45) centre (-215, 45) ccw construction
  circle A3 centre (-215, 45) radius 11 construction
  circle A4 centre (-215, 45) radius 11
  line L0 (-180, 45) -> (-180, 10) projected
  line L1 (-180, 45) -> (-180, 10)
  line L2 (-250, 10) -> (-180, 10) projected
  line L3 (-180, 10) -> (-250, 10)
  line L4 (-250, 10) -> (-250, 45)
  point P0 (0, 0)
  dimension "d53" = 22
extrude "Extrusion15" add sketch "Sketch15" against normal blind 20
sketch "Sketch16" plane through (0, 0, -250) normal (0, 0, -1) x (-1, 0, 0)
  circle A0 centre (215, 45) radius 11 construction
  circle A1 centre (215, 45) radius 21
  point P0 (0, 0)
  dimension "d56" = 42
extrude "Extrusion16" cut sketch "Sketch16" against normal blind 12
sketch "Sketch17" plane through (0, 0, -90) normal (0, 0, 1) x (1, 0, 0)
  circle A0 centre (-215, 45) radius 11 construction
  circle A1 centre (-215, 45) radius 21
  point P0 (0, 0)
  dimension "d59" = 42
extrude "Extrusion17" cut sketch "Sketch17" against normal blind 12
properties part number "MecanumPlate_FEA" material "Aluminum 6061"
